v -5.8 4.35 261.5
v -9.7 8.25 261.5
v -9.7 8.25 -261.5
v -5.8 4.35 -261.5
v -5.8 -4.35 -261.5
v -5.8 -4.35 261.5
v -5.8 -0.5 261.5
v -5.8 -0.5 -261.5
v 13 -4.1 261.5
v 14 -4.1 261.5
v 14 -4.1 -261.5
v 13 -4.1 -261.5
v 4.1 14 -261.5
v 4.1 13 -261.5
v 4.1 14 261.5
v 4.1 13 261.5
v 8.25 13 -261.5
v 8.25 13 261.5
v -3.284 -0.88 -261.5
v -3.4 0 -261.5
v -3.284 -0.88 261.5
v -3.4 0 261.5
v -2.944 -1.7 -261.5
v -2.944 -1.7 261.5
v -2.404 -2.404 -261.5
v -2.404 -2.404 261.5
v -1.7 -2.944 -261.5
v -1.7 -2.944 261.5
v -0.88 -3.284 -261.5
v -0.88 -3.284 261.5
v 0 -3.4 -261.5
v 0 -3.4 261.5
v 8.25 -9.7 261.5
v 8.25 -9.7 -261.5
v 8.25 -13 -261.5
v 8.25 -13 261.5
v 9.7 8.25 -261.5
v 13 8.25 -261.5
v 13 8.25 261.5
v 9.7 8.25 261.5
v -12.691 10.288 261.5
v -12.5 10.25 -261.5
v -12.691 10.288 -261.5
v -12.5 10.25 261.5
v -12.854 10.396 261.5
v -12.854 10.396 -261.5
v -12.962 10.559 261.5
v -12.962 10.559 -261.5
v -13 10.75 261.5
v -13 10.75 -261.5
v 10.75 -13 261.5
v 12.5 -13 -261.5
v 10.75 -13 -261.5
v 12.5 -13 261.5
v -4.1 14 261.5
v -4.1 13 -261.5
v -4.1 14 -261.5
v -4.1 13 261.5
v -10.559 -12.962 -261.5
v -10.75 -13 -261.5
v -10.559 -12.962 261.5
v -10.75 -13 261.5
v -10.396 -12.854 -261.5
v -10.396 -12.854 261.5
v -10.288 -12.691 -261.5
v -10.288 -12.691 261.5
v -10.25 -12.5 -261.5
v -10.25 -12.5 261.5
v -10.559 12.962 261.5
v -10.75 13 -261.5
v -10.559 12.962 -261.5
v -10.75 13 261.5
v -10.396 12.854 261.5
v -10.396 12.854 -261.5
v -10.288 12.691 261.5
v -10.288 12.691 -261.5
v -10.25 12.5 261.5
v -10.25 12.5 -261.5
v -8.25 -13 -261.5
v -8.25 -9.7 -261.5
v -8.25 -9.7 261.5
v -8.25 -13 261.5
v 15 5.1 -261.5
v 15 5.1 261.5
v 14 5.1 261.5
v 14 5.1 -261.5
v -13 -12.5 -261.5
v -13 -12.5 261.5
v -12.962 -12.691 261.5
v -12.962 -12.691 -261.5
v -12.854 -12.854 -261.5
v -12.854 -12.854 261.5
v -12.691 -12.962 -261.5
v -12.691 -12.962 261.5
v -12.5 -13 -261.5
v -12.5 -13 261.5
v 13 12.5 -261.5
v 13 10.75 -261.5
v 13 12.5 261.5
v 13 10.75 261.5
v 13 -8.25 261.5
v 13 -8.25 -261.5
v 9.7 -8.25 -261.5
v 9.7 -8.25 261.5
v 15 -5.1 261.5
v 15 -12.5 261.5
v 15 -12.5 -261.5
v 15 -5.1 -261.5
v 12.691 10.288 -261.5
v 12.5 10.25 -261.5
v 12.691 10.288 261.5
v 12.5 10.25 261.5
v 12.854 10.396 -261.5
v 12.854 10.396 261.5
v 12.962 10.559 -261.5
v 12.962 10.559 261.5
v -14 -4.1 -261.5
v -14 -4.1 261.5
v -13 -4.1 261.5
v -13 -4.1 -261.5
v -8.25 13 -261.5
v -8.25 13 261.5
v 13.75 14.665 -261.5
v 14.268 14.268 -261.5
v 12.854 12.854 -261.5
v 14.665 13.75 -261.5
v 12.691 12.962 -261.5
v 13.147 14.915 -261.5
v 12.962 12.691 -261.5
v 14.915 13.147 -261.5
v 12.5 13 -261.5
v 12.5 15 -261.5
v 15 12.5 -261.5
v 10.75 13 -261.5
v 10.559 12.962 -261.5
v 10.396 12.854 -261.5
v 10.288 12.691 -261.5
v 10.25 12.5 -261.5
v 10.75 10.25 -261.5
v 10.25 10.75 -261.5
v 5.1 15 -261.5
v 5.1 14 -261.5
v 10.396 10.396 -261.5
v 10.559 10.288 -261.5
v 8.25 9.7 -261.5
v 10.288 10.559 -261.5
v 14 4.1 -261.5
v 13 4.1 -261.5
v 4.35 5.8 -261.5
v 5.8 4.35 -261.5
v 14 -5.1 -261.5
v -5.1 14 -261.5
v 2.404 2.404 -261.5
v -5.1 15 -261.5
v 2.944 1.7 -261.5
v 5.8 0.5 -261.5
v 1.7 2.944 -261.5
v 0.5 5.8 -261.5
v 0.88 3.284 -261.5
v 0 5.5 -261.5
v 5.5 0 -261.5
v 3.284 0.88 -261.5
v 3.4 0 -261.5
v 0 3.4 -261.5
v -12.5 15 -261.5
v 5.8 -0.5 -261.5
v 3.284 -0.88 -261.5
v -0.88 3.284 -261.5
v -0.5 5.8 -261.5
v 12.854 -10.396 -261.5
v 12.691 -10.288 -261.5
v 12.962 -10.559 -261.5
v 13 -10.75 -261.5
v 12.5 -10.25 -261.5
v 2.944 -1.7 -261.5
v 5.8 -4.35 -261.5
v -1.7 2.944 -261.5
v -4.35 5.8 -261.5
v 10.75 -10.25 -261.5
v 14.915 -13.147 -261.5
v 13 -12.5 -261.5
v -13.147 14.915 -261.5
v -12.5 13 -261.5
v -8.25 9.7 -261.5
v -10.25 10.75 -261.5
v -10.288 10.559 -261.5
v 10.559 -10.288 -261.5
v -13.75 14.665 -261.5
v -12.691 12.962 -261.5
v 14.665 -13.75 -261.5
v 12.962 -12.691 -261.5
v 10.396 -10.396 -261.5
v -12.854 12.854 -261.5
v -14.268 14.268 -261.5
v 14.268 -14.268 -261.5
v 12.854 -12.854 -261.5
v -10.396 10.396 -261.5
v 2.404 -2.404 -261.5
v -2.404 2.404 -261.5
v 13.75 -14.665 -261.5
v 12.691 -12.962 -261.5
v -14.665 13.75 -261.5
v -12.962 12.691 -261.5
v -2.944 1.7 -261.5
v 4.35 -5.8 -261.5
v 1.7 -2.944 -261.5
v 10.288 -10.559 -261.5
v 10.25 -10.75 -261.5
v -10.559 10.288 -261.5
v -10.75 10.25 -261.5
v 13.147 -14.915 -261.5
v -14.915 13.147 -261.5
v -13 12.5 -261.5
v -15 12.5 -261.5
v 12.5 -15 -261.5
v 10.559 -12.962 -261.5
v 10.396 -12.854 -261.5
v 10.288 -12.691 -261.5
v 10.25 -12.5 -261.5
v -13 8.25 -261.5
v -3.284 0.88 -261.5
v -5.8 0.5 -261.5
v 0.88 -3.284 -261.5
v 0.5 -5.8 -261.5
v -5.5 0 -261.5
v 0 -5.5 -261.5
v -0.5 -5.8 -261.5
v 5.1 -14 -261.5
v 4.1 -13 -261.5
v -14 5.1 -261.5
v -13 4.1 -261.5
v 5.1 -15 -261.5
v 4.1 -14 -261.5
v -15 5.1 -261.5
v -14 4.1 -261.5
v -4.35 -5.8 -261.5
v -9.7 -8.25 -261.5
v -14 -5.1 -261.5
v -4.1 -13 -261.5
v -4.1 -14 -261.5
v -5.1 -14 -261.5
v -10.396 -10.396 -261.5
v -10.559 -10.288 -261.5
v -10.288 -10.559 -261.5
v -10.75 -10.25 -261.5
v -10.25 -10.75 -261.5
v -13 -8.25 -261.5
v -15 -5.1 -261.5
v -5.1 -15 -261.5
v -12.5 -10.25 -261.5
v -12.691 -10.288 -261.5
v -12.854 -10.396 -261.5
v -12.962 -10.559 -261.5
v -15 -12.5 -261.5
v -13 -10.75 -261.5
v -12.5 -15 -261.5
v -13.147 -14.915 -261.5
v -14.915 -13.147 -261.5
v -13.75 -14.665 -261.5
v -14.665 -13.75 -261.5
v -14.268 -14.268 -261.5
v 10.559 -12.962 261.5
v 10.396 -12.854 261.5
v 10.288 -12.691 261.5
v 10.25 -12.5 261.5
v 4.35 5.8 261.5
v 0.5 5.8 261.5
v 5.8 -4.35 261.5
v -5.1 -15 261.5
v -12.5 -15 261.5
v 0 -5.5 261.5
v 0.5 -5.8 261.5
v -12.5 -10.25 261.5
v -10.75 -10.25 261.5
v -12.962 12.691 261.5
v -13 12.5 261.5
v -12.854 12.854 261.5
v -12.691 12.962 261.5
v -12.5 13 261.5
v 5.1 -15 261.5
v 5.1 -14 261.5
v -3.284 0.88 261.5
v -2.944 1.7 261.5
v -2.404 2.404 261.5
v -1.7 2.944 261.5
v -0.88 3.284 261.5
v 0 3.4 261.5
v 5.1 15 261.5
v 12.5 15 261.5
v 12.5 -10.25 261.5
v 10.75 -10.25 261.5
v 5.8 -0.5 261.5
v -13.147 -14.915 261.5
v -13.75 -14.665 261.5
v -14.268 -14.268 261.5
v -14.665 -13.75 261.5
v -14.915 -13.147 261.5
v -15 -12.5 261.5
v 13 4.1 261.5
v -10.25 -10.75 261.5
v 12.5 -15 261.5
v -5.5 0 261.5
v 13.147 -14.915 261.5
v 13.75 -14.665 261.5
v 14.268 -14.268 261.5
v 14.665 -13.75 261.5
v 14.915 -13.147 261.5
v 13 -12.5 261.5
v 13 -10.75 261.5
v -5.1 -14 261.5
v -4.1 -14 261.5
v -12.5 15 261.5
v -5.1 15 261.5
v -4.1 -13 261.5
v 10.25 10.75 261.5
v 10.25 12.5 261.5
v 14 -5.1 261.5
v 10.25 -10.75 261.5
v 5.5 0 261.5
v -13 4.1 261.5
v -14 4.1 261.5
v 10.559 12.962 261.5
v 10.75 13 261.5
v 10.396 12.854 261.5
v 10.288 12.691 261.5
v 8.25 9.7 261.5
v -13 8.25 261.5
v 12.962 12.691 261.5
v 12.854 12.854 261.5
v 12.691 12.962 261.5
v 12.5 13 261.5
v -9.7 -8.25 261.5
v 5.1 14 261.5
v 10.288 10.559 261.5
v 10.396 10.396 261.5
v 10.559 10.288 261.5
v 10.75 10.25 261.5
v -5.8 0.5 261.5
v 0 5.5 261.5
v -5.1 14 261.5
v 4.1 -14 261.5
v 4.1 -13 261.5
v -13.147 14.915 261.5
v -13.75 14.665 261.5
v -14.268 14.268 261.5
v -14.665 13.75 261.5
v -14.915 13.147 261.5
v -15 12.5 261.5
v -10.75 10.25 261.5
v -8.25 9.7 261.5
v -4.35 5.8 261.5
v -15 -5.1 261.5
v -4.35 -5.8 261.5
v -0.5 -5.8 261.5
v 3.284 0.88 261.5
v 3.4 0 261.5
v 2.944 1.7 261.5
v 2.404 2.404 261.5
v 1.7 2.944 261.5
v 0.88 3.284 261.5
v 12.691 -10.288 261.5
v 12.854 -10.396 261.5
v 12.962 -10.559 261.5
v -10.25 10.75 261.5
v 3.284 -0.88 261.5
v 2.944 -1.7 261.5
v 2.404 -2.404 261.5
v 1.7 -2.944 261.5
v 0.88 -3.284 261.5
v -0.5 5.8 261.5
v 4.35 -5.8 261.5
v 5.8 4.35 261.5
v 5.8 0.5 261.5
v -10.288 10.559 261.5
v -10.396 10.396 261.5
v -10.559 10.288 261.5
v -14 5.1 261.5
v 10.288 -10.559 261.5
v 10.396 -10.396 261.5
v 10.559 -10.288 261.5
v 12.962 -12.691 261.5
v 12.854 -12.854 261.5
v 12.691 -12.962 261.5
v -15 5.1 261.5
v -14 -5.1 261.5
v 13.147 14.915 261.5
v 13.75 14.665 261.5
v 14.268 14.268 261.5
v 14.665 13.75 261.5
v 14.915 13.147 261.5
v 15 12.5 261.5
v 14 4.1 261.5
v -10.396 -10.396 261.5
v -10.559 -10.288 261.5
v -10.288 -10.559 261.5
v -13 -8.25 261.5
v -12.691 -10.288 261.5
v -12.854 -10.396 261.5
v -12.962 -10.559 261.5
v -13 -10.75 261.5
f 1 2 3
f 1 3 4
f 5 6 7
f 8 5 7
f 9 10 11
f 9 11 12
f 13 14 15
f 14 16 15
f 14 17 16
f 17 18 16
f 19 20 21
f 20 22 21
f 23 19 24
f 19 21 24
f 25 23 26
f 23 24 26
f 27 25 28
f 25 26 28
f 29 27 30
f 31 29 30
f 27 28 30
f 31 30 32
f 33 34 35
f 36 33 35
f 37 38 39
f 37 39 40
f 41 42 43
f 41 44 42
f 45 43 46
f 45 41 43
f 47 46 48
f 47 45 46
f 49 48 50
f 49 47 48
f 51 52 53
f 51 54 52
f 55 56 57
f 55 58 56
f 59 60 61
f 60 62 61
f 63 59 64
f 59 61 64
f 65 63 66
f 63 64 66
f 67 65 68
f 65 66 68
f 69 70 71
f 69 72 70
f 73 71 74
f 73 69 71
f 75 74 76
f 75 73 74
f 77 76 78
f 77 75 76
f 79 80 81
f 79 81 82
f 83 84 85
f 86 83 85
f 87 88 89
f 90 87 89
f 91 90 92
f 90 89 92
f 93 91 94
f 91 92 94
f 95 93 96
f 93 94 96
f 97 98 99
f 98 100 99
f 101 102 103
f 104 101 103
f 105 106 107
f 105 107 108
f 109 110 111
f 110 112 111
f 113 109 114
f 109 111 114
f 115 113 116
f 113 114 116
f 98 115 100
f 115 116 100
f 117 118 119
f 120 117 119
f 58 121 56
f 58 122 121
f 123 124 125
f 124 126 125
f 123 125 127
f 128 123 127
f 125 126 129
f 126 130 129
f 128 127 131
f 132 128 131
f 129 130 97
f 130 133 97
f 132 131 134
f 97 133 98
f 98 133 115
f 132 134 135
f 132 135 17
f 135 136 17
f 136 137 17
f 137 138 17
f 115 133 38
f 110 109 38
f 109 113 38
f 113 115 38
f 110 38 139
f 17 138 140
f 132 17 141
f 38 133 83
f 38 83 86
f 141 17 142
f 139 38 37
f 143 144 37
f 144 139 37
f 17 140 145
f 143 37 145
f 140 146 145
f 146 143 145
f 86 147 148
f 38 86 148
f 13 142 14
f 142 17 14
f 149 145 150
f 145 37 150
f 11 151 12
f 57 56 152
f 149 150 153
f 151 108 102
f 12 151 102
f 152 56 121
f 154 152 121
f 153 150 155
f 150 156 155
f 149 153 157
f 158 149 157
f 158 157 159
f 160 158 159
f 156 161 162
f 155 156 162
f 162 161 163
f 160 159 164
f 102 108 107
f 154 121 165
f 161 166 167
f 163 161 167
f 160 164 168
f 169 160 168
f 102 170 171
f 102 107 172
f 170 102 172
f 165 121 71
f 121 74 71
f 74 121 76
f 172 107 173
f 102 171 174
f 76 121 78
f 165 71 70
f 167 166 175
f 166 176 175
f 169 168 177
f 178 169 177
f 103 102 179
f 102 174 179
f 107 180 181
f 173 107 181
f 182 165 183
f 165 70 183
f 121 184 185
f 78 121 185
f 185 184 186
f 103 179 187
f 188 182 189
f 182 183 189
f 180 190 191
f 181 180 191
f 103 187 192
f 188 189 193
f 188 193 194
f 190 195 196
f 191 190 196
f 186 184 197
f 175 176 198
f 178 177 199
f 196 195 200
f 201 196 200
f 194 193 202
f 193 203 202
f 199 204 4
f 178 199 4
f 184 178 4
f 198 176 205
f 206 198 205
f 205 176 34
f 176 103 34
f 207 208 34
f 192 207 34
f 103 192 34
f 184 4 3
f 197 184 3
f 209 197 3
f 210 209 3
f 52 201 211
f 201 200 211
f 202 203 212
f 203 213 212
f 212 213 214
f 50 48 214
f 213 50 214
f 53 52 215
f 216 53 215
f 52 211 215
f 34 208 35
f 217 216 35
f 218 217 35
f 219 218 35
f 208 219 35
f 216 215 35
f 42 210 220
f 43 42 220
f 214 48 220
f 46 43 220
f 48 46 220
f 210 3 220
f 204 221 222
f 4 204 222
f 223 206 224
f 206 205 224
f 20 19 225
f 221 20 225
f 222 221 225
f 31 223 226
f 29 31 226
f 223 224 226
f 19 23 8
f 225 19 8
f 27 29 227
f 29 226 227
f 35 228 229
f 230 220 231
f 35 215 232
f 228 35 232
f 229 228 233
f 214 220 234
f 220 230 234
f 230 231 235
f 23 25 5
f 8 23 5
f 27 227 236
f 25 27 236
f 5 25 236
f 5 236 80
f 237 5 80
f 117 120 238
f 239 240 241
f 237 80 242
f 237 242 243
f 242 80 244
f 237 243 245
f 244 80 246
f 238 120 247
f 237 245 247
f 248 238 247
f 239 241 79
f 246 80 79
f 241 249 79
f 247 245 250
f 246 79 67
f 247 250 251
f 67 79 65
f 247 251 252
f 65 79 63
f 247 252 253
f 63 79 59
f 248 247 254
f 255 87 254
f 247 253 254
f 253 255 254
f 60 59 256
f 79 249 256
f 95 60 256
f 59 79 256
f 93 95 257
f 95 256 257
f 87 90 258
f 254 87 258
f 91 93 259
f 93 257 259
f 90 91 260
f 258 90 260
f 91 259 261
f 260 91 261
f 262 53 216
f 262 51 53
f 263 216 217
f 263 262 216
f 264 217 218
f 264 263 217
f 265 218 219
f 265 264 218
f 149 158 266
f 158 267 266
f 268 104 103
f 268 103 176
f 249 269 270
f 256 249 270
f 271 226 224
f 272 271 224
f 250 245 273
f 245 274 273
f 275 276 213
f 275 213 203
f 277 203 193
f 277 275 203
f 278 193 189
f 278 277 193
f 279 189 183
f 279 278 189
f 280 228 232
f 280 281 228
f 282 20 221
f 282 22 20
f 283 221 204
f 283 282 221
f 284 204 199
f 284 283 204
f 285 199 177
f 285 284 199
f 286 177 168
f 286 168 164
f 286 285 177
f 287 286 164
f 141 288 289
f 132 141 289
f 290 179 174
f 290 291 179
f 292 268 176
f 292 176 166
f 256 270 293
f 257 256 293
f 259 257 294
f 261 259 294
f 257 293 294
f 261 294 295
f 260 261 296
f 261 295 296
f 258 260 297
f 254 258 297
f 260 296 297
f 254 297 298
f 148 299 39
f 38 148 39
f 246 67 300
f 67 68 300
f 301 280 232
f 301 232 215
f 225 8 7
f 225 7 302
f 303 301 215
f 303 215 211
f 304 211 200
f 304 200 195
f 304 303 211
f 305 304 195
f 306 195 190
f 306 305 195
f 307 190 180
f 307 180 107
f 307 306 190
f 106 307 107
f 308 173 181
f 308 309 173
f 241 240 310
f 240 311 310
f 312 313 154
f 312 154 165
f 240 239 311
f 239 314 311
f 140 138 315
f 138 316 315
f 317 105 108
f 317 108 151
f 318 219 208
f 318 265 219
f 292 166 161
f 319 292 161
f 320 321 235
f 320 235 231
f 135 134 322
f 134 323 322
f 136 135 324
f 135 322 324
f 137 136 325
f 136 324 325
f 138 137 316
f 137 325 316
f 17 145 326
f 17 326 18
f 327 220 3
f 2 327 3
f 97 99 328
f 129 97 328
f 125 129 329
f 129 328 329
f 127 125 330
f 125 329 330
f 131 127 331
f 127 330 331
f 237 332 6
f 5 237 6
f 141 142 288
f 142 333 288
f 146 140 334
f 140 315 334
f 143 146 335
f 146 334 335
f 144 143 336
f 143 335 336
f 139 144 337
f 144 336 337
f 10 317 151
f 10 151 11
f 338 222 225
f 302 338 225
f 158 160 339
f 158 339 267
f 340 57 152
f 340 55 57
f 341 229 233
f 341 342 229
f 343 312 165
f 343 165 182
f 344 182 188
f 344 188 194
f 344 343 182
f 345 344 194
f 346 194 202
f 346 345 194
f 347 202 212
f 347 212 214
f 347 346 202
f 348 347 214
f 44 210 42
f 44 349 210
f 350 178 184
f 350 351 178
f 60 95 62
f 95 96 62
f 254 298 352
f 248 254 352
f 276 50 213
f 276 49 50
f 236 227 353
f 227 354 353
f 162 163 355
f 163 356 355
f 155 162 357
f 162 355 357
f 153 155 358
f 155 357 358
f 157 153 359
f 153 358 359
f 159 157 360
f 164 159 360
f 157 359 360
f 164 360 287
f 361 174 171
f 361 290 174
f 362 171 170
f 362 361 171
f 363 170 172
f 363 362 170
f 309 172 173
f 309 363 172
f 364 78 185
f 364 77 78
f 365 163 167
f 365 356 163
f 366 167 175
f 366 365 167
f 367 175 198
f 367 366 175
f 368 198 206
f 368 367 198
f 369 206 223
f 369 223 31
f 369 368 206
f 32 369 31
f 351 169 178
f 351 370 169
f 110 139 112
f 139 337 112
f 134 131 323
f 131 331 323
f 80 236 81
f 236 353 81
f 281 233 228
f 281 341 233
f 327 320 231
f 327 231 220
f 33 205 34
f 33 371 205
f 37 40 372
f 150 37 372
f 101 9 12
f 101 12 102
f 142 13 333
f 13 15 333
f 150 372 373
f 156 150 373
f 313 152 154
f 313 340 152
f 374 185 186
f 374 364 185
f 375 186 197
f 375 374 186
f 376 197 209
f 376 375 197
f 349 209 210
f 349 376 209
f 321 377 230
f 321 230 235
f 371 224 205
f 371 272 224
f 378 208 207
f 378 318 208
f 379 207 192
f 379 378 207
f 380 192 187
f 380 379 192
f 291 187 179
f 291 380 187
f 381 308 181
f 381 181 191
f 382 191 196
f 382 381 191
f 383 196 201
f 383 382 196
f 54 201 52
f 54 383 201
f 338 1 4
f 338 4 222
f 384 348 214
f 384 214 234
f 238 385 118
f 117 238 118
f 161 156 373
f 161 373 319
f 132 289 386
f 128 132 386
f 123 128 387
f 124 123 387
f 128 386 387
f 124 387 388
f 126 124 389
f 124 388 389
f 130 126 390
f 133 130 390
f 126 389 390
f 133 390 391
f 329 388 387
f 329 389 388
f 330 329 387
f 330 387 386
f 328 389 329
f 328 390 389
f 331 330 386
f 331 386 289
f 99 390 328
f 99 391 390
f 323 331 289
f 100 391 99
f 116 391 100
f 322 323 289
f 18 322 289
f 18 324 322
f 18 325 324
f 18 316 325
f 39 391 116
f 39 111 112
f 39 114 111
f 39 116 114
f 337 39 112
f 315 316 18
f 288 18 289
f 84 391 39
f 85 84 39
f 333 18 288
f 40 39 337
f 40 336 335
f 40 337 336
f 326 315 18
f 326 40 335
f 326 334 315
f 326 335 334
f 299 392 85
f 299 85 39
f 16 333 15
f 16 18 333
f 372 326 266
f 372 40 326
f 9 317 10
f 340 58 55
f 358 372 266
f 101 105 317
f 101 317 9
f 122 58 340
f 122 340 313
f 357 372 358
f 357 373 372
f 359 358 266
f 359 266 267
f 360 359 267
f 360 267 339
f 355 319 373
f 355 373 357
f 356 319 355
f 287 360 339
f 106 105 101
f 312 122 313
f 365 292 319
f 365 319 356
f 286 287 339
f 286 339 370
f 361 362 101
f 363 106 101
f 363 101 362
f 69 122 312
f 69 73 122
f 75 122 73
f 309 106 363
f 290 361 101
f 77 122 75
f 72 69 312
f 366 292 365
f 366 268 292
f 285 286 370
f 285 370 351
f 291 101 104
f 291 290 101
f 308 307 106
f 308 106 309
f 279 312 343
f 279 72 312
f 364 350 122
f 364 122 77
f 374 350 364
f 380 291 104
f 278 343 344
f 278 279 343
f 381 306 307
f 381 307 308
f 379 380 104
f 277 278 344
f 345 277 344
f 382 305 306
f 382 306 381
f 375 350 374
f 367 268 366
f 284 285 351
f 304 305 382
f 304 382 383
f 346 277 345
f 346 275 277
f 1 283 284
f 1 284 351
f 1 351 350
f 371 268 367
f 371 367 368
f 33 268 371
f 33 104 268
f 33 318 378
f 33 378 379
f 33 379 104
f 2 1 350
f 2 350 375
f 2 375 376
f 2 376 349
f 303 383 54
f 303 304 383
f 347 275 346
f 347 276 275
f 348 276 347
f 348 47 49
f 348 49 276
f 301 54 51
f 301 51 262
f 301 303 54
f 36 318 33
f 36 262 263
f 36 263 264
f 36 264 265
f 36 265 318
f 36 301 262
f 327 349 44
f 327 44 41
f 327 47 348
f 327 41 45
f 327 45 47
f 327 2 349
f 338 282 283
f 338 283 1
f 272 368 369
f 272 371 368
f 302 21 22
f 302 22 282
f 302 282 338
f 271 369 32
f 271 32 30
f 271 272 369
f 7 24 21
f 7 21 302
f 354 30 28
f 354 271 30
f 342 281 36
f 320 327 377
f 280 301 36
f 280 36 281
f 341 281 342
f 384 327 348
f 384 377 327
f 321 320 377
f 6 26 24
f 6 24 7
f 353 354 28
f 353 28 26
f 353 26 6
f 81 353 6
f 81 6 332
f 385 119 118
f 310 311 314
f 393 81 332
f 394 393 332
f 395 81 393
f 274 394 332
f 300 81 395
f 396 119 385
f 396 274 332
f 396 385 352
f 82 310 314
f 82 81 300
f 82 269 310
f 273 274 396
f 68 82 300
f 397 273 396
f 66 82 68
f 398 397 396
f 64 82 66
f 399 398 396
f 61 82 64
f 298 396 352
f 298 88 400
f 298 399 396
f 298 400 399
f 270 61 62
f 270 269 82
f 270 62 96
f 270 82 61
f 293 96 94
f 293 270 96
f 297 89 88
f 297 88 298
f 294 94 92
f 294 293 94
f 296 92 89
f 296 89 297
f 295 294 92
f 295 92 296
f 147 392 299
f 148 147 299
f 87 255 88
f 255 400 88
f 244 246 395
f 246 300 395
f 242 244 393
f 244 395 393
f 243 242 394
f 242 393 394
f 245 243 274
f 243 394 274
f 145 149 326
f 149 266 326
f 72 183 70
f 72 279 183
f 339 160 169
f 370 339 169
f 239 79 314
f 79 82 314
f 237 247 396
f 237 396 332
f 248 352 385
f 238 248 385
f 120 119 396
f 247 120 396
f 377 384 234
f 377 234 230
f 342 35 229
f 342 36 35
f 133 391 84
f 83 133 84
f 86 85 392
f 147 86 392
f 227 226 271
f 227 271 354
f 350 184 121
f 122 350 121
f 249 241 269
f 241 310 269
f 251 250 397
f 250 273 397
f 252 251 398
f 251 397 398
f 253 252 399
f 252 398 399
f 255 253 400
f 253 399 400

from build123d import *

# Parameters (mm, degrees)
F1_DEPTH = 261.5


with BuildPart() as f1:
    # F0 (on Top) → F1 (new body, symmetric)
    with BuildSketch(Plane.XY):
        with BuildLine():
            Line((-5.1, 14), (-5.1, 15))
            Line((-5.1, 15), (-12.5, 15))
            ThreePointArc((-12.5, 15), (-14.267767, 14.267767), (-15, 12.5))
            Line((-15, 12.5), (-15, 5.1))
            Line((-15, 5.1), (-14, 5.1))
            Line((-14, 5.1), (-14, 4.1))
            Line((-14, 4.1), (-13, 4.1))
            Line((-13, 4.1), (-13, 8.25))
            Line((-13, 8.25), (-9.7, 8.25))
            Line((-9.7, 8.25), (-5.8, 4.35))
            Line((-5.8, 4.35), (-5.8, 0.5))
            Line((-5.8, 0.5), (-5.5, 0))
            Line((-5.5, 0), (-3.4, 0))
            ThreePointArc((-3.4, 0), (-2.404163, 2.404163), (0, 3.4))
            Line((0, 3.4), (0, 5.5))
            Line((0, 5.5), (-0.5, 5.8))
            Line((-0.5, 5.8), (-4.35, 5.8))
            Line((-4.35, 5.8), (-8.25, 9.7))
            Line((-8.25, 9.7), (-8.25, 13))
            Line((-8.25, 13), (-4.1, 13))
            Line((-4.1, 13), (-4.1, 14))
            Line((-4.1, 14), (-5.1, 14))
        make_face()
        with BuildLine():
            ThreePointArc((-13, 12.5), (-12.853553, 12.853553), (-12.5, 13))
            Line((-12.5, 13), (-10.75, 13))
            ThreePointArc((-10.75, 13), (-10.396447, 12.853553), (-10.25, 12.5))
            Line((-10.25, 12.5), (-10.25, 10.75))
            ThreePointArc((-10.25, 10.75), (-10.396447, 10.396447), (-10.75, 10.25))
            Line((-10.75, 10.25), (-12.5, 10.25))
            ThreePointArc((-12.5, 10.25), (-12.853553, 10.396447), (-13, 10.75))
            Line((-13, 10.75), (-13, 12.5))
        make_face(mode=Mode.SUBTRACT)
    extrude(amount=F1_DEPTH, both=True)

    # F2: F1 across face


with BuildPart() as f1_1:
    add(f1.part)
    add(f1.part.mirror(Plane(origin=(0, 4.45, 0), x_dir=(0, 1, 0), z_dir=(1, 0, 0))))

    # F3: F1 across face


with BuildPart() as f1_2:
    add(f1_1.part)
    add(f1_1.part.mirror(Plane(origin=(-4.45, 0, 0), x_dir=(1, 0, 0), z_dir=(0, -1, 0))))


solid = f1_2.part
